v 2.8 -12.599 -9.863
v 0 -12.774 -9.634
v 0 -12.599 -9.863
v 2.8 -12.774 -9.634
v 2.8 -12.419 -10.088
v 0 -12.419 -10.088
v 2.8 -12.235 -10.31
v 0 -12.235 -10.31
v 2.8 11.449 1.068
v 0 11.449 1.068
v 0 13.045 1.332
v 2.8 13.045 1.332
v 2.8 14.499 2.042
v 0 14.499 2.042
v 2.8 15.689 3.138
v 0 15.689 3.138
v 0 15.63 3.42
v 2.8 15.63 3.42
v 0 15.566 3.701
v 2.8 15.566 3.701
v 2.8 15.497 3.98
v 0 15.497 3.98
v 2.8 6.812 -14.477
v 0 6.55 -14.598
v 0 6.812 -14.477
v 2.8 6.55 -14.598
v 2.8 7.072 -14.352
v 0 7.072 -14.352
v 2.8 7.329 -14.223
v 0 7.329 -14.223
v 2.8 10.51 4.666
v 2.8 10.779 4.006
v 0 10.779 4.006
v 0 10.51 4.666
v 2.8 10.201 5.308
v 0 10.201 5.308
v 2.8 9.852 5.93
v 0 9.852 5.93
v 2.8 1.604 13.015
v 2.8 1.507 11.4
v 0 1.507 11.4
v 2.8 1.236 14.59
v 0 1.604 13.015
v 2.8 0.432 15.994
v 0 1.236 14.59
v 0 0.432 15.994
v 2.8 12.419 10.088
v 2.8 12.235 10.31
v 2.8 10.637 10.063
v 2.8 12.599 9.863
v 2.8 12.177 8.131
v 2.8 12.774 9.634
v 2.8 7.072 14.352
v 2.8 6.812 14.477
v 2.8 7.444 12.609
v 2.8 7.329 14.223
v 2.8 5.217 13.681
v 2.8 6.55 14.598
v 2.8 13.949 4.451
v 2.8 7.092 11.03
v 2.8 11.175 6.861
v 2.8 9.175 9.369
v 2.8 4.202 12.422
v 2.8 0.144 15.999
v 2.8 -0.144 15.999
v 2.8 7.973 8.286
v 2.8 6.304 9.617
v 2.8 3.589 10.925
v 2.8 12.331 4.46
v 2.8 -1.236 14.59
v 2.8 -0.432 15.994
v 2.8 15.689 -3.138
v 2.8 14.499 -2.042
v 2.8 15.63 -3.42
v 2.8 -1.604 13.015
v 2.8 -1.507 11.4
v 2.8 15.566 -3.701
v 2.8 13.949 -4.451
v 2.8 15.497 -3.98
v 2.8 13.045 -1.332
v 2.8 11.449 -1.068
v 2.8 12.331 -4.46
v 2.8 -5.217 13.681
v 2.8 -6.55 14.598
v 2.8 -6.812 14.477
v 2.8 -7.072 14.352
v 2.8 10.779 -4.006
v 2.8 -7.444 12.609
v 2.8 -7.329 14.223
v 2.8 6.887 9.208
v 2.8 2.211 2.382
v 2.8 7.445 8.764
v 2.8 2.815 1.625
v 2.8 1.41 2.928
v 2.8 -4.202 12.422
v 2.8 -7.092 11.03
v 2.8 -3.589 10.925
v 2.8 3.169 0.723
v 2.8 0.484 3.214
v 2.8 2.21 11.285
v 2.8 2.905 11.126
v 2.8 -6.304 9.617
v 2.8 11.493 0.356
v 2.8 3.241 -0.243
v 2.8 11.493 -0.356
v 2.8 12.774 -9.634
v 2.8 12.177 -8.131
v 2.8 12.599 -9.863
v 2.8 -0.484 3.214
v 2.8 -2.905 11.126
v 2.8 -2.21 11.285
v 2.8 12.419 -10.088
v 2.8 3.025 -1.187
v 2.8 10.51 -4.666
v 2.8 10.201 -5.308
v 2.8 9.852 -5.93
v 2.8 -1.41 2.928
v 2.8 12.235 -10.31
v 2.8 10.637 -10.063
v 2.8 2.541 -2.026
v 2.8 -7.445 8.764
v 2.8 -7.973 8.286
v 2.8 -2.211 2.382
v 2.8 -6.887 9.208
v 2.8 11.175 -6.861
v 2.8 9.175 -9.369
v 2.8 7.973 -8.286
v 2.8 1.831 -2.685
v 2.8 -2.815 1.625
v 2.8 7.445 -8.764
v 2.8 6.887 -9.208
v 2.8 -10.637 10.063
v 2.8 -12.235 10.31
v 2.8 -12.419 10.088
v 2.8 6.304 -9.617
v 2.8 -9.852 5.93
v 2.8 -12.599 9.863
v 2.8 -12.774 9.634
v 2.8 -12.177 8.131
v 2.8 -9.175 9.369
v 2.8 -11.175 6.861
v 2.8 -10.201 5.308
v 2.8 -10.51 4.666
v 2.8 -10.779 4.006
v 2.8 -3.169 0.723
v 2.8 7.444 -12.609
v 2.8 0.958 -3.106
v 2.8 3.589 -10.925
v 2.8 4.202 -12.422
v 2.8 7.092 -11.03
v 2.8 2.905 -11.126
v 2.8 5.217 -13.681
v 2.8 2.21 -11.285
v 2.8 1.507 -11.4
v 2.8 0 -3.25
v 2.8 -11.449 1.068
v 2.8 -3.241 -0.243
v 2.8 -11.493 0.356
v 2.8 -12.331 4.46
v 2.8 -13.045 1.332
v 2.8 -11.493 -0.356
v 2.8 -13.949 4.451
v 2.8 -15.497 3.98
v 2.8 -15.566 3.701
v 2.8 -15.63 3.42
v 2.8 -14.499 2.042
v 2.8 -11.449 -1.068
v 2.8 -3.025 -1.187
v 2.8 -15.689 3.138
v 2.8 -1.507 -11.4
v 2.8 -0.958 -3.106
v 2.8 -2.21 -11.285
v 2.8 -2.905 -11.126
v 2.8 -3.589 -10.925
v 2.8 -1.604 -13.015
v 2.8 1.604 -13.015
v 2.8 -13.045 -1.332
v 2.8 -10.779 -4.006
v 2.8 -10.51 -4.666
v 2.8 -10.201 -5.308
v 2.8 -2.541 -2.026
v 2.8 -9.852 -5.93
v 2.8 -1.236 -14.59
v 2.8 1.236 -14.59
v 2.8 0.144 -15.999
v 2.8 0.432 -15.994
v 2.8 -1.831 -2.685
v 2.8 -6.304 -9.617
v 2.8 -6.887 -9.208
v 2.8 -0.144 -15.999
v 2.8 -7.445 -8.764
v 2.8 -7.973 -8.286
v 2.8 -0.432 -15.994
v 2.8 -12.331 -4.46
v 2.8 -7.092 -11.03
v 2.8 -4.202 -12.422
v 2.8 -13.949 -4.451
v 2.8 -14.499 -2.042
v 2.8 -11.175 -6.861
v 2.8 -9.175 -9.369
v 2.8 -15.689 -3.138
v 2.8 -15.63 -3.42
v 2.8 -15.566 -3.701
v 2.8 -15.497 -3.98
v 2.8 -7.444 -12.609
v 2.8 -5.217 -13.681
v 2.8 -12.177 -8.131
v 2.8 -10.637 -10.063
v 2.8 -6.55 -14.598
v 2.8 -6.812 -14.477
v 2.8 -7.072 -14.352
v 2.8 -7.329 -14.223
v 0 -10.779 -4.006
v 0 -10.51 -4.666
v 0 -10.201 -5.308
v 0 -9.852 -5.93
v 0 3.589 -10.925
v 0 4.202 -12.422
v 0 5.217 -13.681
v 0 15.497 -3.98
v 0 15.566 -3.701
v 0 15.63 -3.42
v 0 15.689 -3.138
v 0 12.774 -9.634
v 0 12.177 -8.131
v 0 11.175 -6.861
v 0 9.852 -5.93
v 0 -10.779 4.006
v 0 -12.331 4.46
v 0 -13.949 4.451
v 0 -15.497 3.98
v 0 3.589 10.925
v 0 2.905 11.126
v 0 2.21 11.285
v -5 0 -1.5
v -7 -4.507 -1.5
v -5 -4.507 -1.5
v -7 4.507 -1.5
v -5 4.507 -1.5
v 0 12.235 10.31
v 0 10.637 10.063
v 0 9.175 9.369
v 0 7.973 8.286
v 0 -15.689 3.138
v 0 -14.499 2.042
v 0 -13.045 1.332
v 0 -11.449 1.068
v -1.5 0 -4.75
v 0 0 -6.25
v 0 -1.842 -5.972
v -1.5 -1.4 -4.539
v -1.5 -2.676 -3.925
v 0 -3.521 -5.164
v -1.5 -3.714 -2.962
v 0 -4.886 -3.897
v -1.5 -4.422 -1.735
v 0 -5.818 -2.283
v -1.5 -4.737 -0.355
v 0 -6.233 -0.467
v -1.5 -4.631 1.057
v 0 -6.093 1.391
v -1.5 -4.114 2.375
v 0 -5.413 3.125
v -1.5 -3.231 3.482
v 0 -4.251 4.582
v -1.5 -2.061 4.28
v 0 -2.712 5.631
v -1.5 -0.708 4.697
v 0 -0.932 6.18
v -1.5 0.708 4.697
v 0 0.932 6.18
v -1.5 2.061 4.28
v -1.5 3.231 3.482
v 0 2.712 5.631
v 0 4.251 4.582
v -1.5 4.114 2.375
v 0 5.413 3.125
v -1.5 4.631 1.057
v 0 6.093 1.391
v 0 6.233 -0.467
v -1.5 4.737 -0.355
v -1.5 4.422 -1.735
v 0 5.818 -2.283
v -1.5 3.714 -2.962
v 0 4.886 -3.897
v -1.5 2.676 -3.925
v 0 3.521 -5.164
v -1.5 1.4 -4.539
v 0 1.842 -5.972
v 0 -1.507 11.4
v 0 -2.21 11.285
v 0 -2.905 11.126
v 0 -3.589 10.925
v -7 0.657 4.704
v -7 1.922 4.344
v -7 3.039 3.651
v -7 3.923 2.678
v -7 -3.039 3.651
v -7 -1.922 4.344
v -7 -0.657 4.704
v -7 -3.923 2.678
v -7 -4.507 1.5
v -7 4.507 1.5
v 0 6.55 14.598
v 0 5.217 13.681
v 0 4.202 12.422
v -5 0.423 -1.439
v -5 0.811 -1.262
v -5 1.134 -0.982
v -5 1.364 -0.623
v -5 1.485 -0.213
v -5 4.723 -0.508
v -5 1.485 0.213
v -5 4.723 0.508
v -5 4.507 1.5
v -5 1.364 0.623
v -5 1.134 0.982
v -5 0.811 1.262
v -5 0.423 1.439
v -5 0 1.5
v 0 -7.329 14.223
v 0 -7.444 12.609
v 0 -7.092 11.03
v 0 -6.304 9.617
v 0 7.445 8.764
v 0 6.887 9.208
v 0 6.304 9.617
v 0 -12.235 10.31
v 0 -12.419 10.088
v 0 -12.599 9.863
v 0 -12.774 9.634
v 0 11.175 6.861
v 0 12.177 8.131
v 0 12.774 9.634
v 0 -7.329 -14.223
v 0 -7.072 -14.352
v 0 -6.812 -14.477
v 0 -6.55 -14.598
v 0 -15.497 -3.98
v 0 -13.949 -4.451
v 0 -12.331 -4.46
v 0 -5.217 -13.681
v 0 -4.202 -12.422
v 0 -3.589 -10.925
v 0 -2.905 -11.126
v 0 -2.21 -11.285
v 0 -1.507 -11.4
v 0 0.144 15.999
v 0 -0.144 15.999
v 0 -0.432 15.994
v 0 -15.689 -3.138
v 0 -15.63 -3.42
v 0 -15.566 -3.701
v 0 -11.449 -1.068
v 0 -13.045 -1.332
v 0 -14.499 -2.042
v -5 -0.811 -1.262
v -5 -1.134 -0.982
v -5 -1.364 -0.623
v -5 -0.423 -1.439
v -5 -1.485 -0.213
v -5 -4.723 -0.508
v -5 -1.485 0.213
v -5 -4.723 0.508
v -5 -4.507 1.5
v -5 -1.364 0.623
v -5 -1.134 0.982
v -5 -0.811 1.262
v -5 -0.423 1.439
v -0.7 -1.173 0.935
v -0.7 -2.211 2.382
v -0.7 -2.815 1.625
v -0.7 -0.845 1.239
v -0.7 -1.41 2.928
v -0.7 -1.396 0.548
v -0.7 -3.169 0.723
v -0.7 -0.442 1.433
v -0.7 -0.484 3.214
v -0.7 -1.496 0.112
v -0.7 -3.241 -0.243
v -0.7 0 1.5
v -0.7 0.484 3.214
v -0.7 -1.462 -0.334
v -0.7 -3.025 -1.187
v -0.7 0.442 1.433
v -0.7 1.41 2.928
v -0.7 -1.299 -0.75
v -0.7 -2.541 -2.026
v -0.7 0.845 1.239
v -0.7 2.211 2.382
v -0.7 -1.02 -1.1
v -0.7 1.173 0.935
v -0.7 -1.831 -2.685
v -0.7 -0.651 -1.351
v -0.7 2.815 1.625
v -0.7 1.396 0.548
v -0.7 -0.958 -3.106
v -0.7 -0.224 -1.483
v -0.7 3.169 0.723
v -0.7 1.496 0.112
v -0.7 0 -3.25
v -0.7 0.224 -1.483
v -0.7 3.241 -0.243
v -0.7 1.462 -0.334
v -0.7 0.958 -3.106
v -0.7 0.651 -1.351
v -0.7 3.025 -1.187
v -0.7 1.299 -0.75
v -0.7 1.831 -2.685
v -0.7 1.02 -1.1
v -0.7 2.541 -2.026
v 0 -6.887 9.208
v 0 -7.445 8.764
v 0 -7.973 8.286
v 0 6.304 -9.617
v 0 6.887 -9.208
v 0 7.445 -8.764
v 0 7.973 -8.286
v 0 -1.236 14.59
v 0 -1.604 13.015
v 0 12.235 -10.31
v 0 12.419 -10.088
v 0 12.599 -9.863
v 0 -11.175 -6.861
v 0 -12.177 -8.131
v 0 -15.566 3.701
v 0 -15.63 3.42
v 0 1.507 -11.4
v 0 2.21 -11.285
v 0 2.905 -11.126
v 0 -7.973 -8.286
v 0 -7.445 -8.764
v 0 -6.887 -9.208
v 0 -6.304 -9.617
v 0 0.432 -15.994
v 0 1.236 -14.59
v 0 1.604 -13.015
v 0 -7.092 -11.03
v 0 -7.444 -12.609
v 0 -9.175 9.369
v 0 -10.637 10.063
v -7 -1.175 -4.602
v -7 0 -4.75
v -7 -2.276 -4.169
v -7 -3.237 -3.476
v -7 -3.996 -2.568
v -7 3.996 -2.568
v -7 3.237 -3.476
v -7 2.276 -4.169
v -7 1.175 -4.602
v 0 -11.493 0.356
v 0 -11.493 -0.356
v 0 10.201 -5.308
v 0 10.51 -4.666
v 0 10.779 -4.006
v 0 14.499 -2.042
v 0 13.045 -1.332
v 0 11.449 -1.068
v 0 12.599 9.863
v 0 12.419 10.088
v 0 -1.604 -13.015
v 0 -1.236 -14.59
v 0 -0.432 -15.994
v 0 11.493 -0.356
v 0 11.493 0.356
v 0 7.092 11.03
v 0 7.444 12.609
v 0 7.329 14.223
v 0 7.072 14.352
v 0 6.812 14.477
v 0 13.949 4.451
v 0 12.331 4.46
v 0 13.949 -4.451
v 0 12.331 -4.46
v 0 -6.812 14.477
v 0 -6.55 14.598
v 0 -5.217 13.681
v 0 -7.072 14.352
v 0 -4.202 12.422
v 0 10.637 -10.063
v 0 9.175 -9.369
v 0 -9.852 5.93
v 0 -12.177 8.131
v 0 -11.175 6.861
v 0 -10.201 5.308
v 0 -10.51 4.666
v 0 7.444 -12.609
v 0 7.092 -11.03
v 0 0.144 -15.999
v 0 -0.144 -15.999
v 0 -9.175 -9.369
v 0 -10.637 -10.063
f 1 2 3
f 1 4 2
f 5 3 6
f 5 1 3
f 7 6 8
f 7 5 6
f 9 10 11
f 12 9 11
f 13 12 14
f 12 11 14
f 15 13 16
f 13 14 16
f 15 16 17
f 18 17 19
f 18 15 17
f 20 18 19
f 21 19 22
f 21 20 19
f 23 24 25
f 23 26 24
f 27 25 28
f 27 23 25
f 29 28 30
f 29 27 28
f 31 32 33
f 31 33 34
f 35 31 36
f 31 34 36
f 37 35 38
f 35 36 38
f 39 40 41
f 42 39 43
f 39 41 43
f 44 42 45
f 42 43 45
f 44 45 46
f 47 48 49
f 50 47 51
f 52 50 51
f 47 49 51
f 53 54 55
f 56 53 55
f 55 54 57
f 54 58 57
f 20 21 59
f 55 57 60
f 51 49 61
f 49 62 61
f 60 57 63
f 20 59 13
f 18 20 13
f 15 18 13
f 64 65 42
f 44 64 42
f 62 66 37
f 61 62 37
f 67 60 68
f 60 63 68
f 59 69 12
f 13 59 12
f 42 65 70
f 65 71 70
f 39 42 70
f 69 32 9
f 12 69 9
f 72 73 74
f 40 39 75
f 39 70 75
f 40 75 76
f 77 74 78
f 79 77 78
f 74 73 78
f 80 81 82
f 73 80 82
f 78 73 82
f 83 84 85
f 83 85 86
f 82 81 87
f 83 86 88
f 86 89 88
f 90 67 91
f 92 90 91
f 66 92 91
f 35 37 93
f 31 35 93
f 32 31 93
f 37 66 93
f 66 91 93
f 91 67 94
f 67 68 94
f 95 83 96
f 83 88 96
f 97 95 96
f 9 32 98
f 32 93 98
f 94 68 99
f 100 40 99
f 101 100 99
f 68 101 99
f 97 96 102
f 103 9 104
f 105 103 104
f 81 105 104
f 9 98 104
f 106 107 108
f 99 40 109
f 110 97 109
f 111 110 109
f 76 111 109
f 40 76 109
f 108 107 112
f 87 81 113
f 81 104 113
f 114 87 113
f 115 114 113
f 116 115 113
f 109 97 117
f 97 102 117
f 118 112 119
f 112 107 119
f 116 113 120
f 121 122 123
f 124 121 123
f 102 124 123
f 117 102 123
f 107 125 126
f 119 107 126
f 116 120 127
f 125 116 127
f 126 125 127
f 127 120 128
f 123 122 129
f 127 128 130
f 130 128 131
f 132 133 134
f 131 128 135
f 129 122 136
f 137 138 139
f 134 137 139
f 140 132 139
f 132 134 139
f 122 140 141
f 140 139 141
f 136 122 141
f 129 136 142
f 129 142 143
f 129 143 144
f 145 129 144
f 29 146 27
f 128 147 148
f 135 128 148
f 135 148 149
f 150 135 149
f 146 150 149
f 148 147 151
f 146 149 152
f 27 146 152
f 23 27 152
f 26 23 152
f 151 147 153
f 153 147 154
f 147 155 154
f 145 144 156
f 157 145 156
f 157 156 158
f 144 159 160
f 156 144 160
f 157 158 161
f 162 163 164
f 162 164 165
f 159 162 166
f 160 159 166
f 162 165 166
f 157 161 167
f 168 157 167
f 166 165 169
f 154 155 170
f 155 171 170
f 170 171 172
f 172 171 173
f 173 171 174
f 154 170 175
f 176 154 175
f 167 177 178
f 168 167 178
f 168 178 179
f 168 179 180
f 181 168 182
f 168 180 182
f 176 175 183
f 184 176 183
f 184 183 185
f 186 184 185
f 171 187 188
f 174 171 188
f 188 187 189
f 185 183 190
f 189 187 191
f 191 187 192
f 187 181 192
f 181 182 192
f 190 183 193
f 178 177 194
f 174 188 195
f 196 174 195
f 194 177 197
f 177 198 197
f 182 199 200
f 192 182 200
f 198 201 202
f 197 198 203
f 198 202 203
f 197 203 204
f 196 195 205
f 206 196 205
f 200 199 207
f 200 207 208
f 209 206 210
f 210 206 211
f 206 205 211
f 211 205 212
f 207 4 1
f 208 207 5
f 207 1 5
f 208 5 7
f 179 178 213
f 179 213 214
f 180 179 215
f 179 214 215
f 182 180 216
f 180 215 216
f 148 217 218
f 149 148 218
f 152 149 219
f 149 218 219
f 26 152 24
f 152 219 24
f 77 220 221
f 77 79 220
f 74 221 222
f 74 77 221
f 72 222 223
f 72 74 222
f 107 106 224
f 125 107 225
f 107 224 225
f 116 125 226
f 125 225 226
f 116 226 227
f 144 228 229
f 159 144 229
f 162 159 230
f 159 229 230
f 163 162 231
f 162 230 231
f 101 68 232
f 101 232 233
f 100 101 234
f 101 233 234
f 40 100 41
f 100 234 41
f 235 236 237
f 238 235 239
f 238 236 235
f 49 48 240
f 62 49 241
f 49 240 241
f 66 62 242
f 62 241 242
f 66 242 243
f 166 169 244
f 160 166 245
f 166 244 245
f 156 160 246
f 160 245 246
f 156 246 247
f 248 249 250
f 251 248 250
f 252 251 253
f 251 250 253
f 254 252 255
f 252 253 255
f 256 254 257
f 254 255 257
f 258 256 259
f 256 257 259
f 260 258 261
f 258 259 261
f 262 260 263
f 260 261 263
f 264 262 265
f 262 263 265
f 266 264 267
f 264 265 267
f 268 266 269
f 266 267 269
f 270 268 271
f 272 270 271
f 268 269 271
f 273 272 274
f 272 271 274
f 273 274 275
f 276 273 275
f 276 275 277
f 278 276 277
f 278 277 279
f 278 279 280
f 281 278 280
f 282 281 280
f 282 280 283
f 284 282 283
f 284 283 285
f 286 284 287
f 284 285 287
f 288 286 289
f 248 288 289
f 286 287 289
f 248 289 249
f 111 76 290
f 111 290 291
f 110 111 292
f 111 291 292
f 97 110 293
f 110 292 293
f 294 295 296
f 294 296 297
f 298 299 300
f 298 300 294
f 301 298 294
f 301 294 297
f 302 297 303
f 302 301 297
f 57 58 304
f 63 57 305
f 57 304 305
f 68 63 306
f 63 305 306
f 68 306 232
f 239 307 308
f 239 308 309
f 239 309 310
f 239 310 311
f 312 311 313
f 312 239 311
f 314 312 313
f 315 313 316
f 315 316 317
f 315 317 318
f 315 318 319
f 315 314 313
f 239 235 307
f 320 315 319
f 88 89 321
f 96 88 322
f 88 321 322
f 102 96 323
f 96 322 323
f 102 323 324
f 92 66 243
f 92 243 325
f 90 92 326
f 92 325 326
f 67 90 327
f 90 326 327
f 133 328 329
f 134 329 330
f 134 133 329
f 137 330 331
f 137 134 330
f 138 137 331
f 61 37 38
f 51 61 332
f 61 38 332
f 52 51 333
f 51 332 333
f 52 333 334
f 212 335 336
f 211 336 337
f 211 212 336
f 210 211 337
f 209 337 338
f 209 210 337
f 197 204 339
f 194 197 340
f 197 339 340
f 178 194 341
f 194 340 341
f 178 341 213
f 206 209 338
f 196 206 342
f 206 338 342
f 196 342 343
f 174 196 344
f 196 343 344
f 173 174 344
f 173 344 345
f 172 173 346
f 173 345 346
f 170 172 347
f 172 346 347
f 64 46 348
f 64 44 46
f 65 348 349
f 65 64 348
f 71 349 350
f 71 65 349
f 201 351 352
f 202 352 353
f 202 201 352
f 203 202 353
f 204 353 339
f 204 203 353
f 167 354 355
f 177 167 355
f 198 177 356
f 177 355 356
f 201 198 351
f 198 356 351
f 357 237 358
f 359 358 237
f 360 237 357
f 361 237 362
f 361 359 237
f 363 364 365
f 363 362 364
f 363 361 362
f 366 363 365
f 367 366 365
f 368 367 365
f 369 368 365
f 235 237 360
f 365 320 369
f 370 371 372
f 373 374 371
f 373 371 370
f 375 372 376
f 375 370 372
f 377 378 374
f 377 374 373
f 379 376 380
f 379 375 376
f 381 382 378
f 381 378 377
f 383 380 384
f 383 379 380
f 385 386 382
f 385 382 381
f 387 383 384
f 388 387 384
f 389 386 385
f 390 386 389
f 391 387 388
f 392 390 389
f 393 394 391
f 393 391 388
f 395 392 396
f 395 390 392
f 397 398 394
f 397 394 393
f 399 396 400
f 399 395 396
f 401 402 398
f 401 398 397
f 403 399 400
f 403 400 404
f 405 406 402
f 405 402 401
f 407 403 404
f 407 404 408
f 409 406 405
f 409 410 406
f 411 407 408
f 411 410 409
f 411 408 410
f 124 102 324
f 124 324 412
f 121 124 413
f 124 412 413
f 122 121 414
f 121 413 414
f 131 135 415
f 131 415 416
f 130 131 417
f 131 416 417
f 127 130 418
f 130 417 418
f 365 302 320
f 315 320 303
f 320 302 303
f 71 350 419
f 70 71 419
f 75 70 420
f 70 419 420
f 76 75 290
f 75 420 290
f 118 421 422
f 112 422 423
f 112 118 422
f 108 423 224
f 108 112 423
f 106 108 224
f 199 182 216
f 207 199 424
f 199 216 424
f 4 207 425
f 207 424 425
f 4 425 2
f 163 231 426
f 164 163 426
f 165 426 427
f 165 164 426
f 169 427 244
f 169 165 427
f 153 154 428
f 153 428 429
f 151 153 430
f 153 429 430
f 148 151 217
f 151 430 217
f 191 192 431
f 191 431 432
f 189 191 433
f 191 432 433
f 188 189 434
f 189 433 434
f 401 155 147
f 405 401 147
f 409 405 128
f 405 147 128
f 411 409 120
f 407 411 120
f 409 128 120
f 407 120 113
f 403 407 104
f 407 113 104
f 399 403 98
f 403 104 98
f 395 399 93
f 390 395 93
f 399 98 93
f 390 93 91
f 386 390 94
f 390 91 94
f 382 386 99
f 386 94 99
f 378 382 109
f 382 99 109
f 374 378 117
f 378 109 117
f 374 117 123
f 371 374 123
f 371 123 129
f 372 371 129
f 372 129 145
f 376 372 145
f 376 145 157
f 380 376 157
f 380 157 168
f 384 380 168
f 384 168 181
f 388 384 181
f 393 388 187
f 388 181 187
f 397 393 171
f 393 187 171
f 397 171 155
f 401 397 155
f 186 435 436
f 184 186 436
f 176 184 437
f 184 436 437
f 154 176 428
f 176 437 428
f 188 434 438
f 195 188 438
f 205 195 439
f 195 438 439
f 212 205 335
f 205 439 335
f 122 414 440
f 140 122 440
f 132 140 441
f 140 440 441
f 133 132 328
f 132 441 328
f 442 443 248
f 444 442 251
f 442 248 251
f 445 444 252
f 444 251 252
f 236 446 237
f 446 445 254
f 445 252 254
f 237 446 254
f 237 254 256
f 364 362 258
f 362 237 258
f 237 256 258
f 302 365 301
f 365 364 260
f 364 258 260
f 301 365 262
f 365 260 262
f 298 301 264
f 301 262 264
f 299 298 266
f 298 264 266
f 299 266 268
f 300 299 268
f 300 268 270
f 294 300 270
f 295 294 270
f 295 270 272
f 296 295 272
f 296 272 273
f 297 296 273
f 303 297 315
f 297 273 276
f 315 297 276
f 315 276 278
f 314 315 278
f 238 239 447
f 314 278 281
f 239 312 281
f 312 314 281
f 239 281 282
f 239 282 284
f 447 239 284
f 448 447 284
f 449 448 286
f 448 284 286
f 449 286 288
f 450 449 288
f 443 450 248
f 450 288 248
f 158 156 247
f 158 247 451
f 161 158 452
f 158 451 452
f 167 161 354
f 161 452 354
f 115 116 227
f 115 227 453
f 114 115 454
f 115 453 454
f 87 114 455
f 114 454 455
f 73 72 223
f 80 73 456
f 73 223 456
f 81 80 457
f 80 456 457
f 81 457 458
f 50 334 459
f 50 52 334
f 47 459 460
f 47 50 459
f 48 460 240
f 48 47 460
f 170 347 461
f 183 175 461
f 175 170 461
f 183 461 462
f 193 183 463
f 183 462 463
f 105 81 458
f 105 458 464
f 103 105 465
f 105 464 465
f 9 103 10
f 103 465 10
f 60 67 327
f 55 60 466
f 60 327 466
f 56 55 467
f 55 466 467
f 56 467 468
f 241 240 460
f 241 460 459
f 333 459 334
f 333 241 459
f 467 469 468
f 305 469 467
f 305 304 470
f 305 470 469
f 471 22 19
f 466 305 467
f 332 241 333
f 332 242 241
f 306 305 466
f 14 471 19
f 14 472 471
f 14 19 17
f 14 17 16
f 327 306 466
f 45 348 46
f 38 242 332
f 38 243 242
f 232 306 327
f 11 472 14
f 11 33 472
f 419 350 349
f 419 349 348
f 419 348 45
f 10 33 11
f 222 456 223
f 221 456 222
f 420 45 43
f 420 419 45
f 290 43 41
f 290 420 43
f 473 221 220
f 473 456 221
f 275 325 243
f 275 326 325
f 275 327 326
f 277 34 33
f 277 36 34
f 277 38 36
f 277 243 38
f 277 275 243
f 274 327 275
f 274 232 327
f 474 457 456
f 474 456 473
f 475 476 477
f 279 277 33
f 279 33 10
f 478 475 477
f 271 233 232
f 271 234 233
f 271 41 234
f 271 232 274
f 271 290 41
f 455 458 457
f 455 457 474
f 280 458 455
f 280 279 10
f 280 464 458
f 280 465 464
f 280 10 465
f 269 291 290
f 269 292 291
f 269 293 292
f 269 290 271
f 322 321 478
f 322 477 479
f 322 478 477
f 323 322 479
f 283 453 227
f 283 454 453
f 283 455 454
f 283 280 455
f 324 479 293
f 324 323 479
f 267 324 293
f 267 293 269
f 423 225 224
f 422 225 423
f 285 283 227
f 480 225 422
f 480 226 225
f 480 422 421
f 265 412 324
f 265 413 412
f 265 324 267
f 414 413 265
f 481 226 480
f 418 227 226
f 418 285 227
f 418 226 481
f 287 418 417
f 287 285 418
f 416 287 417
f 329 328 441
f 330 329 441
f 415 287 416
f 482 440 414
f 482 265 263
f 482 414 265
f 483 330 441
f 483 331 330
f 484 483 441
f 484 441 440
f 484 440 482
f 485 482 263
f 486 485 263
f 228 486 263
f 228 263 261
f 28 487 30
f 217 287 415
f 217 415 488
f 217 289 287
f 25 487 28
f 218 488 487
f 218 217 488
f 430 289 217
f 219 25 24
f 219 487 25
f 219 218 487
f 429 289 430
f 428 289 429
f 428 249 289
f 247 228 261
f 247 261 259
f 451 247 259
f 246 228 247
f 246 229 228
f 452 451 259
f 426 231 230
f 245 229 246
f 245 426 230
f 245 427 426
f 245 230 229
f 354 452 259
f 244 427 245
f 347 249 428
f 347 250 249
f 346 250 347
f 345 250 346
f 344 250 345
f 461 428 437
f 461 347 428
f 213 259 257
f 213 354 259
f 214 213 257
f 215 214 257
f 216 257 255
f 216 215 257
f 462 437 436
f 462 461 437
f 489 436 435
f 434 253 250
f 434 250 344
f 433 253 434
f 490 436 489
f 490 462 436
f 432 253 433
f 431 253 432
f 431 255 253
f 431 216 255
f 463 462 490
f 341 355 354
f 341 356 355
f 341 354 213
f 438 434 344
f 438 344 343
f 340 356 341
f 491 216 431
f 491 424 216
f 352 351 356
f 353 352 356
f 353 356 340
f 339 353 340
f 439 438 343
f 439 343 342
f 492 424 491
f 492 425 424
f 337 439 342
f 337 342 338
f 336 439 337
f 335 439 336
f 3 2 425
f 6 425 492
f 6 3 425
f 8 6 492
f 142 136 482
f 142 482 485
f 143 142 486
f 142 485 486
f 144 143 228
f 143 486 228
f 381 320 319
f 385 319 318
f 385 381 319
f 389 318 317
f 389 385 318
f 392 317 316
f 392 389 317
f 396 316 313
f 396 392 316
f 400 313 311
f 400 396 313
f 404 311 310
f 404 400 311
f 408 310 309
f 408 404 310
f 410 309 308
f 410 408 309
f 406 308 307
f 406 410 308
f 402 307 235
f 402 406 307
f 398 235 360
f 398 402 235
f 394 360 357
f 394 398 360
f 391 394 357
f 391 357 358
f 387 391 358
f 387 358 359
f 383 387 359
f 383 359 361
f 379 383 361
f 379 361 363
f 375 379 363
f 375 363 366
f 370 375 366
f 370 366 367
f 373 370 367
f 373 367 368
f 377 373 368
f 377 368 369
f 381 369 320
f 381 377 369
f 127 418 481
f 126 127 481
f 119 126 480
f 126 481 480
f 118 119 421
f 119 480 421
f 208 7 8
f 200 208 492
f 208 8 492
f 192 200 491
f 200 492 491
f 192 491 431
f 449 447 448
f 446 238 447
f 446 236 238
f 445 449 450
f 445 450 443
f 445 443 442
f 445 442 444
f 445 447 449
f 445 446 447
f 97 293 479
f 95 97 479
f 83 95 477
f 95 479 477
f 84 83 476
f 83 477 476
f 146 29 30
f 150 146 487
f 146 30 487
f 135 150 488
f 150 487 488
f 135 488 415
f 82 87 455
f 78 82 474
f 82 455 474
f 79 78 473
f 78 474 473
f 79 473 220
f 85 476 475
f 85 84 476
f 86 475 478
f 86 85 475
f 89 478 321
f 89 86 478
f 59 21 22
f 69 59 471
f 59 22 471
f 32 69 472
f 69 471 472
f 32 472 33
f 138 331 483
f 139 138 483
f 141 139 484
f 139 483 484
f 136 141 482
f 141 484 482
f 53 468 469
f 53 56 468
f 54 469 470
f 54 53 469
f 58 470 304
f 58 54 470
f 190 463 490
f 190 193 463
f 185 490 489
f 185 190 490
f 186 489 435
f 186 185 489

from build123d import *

# Parameters (mm, degrees)
BASPROSKE_W         = 2.8
BASPROSKE_H         = 16
TOOTHCUT_DEPTH      = 23.8
TEETHCUTS_COUNT     = 14
BORSKE_R            = 1.5
BORE_DEPTH          = 50.0000508
SKETCH_2_R          = 4.75
SKETCH_2_R_2        = 1.5
EXTRUDE_1_DEPTH     = 7
SKETCH_3_R          = 3.25
CUT_EXTRUDE_1_DEPTH = 3.5
CHAMFER_1_SIZE      = 1.5
SKETCH_4_W          = 3
SKETCH_4_H          = 9.5
CUT_EXTRUDE_2_DEPTH = 2


with BuildPart() as part:
    # BasProSke → Base-Revolve (revolve)
    with BuildSketch(Plane(origin=(0, 0, 0), x_dir=(1, 0, 0), z_dir=(0, 1, 0)), mode=Mode.PRIVATE) as base_revolve_sk:
        with Locations((1.4, 8)):
            Rectangle(BASPROSKE_W, BASPROSKE_H)
    revolve(base_revolve_sk.sketch.rotate(Axis((-10, 0, 0), (1, 0, 0)), 180), axis=Axis((-10, 0, 0), (1, 0, 0)))

    # TooCutSke → ToothCut (cut, through all)
    with BuildSketch(Plane(origin=(0, 0, 0), x_dir=(0, 0, -1), z_dir=(1, 0, 0))):
        with BuildLine():
            ThreePointArc((1.067858192, 11.449309144), (0, 11.499), (-1.067858192, 11.449309144))
            ThreePointArc((-1.067858192, 11.449309144), (-1.641684211, 13.812780716), (-3.163375005, 15.710076503))
            ThreePointArc((-3.163375005, 15.710076503), (0, 16.0254), (3.163375005, 15.710076503))
            ThreePointArc((3.163375005, 15.710076503), (1.641684211, 13.812780716), (1.067858192, 11.449309144))
        make_face()
    toothcut = extrude(amount=TOOTHCUT_DEPTH, mode=Mode.SUBTRACT)

    # TeethCuts: ToothCut ×14 about axis
    teethcuts_axis = Axis((0, 0, 0), (1, 0, 0))
    for i in range(1, TEETHCUTS_COUNT):
        add(toothcut.rotate(teethcuts_axis, i * 360 / TEETHCUTS_COUNT), mode=Mode.SUBTRACT)

    # BorSke → Bore (cut, symmetric)
    with BuildSketch(Plane(origin=(0, 0, 0), x_dir=(0, 0, -1), z_dir=(1, 0, 0))):
        with Locations(Location((0, 0, 0), (0, 0, 180))):
            Circle(BORSKE_R)
    extrude(amount=BORE_DEPTH, both=True, mode=Mode.SUBTRACT)

    # ｽｹｯﾁ2 → ﾎﾞｽ - 押し出し1 (add)
    with BuildSketch(Plane.ZY):
        with Locations(Location((0, 0, 0), (0, 0, 180))):
            Circle(SKETCH_2_R)
        Circle(SKETCH_2_R_2, mode=Mode.SUBTRACT)
    extrude(amount=EXTRUDE_1_DEPTH)

    # ｽｹｯﾁ3 → ｶｯﾄ - 押し出し1 (cut)
    with BuildSketch(Plane(origin=(2.8, 0, 0), x_dir=(0, 0, -1), z_dir=(1, 0, 0))):
        Circle(SKETCH_3_R)
    extrude(amount=-CUT_EXTRUDE_1_DEPTH, mode=Mode.SUBTRACT)

    # 面取り1
    chamfer_1_edges = [part.edges().sort_by_distance(p)[0] for p in [
        (0, 0, 4.75),
    ]]
    chamfer(chamfer_1_edges, length=CHAMFER_1_SIZE)

    # ｽｹｯﾁ4 → ｶｯﾄ - 押し出し2 (cut)
    with BuildSketch(Plane.ZY.offset(7)):
        Rectangle(SKETCH_4_W, SKETCH_4_H)
    extrude(amount=-CUT_EXTRUDE_2_DEPTH, mode=Mode.SUBTRACT)


solid = part.part
